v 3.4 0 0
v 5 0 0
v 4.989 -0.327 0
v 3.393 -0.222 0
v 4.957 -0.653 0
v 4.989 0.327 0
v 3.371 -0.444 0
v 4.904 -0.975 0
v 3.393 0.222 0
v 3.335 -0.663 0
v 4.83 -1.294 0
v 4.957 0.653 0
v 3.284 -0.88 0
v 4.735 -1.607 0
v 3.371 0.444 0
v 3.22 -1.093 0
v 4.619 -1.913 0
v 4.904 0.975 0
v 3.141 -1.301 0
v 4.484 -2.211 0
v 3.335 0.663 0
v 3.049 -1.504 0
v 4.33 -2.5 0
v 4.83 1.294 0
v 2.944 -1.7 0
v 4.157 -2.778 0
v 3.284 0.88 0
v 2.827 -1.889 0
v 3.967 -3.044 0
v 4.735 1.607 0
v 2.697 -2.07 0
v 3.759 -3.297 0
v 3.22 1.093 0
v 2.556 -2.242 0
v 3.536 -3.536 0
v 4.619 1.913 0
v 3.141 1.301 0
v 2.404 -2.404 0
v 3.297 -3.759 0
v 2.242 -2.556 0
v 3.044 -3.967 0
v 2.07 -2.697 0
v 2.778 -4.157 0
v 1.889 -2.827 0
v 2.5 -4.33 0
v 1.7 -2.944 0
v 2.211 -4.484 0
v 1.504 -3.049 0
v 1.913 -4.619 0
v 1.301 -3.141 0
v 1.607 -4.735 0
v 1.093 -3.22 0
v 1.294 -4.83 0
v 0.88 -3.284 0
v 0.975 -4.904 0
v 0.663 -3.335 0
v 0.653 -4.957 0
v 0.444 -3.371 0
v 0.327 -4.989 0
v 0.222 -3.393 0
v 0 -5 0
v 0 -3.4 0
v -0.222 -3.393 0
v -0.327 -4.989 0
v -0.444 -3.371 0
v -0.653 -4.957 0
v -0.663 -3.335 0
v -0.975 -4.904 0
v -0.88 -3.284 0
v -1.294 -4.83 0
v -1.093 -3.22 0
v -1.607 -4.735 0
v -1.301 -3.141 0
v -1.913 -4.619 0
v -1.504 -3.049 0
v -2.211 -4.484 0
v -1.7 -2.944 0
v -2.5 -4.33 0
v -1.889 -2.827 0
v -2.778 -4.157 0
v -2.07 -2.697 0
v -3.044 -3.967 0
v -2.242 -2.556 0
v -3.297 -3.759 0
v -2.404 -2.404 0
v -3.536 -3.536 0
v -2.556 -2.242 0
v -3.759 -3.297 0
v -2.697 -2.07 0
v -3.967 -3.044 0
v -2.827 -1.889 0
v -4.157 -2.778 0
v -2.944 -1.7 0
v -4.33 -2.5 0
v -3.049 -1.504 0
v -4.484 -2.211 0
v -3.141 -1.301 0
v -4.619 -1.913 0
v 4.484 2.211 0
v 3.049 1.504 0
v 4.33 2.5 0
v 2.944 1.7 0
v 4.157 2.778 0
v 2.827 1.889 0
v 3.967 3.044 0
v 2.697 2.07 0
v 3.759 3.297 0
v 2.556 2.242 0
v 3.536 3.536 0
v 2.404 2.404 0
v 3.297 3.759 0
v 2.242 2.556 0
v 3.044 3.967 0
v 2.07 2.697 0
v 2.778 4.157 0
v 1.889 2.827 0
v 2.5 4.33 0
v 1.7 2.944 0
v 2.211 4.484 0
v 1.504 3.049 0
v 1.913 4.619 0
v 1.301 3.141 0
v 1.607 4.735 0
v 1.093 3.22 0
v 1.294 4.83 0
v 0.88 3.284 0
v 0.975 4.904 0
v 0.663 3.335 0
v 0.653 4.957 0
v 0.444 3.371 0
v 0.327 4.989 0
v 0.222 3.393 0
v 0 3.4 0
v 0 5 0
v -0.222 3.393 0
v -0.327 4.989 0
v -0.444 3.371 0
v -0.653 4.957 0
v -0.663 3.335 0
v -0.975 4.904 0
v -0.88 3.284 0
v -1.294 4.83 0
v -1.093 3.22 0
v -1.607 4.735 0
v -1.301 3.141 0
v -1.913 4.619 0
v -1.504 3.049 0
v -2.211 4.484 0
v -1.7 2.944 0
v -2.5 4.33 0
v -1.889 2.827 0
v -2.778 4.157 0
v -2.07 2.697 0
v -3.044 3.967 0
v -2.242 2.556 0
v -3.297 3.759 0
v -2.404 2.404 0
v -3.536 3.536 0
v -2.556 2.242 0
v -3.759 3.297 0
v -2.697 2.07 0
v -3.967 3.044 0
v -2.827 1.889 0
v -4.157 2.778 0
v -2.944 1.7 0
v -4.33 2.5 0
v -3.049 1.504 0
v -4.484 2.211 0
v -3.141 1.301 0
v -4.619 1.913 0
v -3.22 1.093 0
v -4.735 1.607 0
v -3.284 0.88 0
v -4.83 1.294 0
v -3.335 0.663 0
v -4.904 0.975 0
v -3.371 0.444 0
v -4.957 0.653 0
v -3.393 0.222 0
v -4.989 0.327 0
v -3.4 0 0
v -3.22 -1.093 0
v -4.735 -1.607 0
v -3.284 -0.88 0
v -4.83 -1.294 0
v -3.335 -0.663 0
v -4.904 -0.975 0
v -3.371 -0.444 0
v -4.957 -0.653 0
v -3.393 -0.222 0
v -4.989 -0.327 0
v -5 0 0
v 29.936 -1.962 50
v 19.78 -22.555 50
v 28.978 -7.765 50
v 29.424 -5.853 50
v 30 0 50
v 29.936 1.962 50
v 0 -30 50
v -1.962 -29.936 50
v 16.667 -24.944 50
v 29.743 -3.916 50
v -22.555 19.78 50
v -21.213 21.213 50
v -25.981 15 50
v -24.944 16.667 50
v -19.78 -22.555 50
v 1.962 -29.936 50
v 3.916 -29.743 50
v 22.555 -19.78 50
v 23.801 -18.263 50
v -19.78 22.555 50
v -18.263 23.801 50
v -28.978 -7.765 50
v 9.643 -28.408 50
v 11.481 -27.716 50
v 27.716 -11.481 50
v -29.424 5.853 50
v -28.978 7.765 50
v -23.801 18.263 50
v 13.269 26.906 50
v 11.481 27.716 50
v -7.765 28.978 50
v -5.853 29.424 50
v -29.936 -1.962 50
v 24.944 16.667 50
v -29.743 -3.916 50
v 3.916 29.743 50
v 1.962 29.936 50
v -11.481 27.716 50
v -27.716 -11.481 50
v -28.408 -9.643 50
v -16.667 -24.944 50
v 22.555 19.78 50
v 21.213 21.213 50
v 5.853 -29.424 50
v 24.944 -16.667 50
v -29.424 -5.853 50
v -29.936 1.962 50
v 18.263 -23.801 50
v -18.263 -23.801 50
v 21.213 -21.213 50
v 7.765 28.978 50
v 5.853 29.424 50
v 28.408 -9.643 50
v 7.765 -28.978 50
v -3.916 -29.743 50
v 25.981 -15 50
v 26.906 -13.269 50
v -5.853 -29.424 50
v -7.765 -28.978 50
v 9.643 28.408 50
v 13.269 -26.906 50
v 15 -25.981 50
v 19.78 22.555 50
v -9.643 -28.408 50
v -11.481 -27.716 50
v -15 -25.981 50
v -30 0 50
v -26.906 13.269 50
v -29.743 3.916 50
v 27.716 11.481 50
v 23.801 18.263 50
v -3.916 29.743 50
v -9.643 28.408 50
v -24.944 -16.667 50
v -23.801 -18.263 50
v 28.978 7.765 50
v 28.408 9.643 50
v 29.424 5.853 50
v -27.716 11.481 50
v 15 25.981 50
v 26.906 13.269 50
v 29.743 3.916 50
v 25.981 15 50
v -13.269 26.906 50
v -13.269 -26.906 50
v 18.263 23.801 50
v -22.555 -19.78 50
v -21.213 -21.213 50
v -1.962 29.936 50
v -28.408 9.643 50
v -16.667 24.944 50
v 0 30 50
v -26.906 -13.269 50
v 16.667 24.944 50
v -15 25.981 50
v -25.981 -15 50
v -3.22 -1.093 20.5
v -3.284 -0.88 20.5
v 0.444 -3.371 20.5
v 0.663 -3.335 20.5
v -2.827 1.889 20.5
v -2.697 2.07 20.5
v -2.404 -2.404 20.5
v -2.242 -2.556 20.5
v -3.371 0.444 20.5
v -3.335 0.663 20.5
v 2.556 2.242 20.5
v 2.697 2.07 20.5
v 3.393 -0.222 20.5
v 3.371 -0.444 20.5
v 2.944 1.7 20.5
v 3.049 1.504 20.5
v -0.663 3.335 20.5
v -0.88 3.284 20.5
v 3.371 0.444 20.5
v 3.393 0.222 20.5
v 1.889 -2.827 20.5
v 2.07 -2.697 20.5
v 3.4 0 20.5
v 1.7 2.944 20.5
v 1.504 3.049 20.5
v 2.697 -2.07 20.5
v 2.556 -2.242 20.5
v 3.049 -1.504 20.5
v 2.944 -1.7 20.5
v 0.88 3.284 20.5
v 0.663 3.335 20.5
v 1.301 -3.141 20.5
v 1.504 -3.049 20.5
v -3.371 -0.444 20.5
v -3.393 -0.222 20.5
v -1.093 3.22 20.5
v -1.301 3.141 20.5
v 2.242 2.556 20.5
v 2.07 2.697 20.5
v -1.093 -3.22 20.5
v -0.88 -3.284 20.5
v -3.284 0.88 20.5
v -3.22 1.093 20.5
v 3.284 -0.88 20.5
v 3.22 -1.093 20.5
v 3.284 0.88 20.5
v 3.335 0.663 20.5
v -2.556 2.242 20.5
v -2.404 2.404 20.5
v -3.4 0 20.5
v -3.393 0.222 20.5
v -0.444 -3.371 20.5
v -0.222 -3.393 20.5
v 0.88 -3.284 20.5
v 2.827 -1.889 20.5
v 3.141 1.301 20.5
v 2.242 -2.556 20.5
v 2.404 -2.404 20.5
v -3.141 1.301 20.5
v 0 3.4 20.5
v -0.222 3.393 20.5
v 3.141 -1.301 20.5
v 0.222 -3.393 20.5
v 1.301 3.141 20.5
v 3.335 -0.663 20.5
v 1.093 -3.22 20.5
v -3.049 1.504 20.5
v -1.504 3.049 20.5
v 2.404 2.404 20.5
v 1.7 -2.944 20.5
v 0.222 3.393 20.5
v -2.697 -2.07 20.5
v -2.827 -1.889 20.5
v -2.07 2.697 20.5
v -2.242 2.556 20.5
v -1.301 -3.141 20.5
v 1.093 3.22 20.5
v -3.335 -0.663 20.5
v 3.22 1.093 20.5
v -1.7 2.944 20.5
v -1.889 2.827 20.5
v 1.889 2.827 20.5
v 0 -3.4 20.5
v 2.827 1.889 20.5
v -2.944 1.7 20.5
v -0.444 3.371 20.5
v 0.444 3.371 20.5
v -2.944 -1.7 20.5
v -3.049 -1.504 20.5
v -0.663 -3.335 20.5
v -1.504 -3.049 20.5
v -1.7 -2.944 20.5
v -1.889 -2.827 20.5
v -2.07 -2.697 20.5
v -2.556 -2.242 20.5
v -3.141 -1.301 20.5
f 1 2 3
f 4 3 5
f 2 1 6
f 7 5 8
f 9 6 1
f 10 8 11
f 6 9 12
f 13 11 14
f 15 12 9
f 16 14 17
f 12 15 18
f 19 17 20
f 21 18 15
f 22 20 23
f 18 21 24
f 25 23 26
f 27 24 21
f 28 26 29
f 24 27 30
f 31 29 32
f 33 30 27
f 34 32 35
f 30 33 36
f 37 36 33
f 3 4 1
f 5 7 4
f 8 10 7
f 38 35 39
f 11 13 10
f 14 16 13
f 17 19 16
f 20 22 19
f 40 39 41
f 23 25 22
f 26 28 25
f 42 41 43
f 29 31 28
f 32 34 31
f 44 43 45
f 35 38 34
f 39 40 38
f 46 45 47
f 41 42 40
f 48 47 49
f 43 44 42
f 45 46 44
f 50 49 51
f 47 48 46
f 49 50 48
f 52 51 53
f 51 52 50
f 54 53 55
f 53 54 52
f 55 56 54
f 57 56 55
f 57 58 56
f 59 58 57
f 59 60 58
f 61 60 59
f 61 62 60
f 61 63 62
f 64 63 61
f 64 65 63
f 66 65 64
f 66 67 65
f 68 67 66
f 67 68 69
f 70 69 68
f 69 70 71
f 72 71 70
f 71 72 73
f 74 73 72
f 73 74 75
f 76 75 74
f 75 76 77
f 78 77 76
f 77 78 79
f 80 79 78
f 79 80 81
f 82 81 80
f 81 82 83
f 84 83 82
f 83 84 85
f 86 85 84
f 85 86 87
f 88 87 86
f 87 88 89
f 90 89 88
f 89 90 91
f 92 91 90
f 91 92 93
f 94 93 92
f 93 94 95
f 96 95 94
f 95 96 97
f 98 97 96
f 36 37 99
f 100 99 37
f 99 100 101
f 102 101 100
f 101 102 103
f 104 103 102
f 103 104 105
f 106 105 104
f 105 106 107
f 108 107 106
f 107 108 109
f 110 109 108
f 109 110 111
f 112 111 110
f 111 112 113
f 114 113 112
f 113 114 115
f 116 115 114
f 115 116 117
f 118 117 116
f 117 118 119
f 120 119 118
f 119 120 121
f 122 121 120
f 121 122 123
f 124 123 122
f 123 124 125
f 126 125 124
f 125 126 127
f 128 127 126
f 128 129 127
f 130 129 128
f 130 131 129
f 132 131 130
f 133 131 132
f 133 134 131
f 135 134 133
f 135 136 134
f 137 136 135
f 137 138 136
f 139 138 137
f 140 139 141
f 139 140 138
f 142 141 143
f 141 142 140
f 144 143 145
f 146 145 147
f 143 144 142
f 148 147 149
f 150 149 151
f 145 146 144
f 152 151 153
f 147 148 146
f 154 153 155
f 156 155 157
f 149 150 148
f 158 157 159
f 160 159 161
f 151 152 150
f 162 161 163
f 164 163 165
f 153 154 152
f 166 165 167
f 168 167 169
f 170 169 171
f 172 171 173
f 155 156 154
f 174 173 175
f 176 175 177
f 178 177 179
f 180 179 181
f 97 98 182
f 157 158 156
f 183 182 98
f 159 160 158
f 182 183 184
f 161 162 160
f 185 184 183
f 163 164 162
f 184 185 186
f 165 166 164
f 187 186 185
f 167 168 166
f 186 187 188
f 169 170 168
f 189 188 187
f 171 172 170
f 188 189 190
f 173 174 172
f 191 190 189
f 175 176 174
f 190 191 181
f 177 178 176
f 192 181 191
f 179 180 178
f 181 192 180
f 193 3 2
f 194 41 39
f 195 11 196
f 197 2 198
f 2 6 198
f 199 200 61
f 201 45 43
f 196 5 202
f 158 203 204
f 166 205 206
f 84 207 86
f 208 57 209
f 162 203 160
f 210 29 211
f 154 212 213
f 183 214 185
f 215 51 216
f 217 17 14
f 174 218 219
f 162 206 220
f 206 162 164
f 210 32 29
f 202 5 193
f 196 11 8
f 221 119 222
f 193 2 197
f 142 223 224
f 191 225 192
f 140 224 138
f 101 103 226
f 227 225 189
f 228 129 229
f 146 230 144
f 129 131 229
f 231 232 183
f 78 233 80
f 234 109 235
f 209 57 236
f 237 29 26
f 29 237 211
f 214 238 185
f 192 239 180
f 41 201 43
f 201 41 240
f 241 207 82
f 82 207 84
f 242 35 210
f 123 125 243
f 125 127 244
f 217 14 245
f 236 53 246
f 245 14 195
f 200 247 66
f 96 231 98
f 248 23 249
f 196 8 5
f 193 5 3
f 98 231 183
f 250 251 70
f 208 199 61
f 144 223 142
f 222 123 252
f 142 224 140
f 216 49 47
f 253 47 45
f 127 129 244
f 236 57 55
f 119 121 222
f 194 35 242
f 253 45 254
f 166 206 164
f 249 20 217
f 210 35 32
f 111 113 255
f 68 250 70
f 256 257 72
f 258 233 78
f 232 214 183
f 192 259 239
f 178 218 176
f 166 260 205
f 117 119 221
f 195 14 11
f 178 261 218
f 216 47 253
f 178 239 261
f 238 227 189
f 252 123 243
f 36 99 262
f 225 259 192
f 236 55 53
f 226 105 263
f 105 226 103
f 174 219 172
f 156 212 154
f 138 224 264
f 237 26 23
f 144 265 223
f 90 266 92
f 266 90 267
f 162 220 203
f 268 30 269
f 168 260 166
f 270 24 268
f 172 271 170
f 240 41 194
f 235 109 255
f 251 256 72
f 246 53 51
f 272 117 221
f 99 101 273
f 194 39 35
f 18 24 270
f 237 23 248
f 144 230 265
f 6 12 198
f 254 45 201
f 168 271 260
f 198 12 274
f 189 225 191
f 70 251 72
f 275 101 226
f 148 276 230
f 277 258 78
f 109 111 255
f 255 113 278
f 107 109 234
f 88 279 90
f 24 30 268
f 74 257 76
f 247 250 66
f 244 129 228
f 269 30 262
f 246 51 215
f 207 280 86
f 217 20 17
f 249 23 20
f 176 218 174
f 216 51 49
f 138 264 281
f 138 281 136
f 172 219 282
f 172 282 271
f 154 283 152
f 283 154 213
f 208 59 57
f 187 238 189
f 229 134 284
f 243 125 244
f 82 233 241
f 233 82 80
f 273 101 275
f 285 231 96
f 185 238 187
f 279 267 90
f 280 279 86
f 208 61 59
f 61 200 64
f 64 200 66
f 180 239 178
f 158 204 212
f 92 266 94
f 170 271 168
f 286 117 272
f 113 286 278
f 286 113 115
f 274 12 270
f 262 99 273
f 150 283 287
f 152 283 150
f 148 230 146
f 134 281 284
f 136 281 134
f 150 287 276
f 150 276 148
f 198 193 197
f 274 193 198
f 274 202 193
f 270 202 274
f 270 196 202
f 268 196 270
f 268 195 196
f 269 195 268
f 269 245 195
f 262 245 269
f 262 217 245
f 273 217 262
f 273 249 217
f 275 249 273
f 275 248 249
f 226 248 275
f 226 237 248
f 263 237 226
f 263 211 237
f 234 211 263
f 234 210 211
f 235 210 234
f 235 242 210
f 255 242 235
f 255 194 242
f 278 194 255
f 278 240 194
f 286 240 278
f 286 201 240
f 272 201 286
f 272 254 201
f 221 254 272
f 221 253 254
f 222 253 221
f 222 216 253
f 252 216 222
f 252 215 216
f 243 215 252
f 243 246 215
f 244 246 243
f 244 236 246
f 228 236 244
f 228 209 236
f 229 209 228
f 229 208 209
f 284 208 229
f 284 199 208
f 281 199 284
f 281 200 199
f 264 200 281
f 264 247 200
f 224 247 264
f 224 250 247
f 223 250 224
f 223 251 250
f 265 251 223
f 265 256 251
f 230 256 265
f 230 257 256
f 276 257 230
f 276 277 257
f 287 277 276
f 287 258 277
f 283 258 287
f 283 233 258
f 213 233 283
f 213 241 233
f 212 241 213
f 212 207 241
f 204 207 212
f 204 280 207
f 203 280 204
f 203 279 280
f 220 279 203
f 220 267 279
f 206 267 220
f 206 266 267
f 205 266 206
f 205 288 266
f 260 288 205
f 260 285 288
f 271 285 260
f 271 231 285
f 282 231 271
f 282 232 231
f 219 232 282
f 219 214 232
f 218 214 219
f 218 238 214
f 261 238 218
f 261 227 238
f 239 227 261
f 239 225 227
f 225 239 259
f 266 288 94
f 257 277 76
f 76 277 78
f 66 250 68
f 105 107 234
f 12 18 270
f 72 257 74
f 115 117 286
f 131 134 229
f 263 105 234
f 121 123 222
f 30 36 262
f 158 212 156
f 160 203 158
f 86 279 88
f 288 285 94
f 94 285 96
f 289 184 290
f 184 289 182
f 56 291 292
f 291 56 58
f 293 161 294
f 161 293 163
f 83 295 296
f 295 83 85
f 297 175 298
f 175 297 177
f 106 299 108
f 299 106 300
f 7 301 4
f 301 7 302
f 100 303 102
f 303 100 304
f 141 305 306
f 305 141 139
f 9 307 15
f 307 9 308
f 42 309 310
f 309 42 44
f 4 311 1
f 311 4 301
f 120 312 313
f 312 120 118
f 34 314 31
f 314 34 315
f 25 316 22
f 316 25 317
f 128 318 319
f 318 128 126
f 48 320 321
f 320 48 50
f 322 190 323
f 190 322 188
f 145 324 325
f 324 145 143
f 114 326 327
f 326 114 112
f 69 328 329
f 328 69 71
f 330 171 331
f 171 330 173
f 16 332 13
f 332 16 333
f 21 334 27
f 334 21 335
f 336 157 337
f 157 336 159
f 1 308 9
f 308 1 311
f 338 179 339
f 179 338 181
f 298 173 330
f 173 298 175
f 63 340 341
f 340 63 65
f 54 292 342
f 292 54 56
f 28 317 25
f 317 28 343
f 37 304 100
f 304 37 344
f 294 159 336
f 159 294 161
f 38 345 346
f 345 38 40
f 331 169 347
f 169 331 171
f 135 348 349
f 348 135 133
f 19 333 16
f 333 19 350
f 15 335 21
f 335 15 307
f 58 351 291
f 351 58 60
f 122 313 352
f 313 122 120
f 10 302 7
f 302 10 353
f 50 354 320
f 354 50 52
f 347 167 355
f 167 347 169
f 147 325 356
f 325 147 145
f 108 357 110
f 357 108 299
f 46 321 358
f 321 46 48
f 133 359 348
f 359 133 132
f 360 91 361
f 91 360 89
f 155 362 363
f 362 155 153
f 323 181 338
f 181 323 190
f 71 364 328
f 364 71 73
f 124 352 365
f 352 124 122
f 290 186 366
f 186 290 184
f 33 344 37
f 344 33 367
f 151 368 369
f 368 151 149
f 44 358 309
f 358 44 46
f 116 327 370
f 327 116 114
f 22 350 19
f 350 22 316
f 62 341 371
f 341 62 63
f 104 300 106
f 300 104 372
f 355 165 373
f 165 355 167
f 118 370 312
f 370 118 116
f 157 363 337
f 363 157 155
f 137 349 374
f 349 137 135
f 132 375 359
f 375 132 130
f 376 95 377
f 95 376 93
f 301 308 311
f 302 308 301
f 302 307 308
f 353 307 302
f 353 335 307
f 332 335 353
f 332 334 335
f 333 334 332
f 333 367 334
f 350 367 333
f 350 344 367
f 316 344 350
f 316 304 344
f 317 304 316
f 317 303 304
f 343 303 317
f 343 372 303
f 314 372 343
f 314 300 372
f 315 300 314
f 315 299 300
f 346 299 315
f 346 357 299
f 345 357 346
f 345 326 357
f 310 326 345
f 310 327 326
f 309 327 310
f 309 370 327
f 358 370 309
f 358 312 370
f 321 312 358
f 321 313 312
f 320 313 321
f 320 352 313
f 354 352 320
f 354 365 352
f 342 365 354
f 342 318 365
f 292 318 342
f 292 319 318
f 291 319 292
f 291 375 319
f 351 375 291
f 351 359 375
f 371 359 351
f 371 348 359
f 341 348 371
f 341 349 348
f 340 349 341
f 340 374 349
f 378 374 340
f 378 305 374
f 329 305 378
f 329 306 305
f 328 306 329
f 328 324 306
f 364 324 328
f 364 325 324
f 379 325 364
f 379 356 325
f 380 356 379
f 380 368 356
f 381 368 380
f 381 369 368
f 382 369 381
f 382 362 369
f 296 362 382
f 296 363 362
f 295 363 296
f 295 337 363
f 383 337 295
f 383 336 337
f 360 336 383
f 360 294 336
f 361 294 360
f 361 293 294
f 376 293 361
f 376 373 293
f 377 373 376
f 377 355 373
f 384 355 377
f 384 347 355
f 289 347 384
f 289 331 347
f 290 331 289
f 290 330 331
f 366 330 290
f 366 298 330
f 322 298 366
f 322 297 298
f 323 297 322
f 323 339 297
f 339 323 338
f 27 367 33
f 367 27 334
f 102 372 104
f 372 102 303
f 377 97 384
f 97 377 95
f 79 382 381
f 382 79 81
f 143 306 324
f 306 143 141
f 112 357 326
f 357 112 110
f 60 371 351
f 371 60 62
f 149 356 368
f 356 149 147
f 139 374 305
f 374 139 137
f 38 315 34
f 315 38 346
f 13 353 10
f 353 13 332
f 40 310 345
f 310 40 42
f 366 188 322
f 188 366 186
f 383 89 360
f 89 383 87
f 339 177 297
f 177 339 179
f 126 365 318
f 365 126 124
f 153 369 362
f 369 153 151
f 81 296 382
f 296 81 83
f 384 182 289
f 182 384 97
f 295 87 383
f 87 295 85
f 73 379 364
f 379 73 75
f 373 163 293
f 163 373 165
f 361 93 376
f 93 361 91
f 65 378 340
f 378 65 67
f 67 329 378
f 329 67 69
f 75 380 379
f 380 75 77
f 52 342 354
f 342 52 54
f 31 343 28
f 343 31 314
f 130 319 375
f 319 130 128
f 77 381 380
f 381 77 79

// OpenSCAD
// Small lab funnel - printed upright, open at top and bottom
// Units: mm

// ---- Parameters ----
spout_od      = 10;    // spout outer diameter
spout_id      = spout_od - 2 * 1.6;  // spout bore (6.8)
spout_h       = 20;    // spout height (z = 0 to 20)
cone_top_d    = 10;    // cone diameter where it meets the spout (z = 20)
cone_rim_d    = 60;    // cone rim diameter (z = 50)
cone_h        = cone_rim_d - cone_top_d;  // cone height (30)
wall          = 1.6;   // wall thickness everywhere
eps           = 0.5;   // cutter overshoot past faces

$fn = 96;

// ---- Model ----
difference() {
    union() {
        // Spout (tube)
        cylinder(d = spout_od, h = spout_h);
        // Cone - note: cylinder(d1,d2,h) has d1 at the lower end (z = 20)
        cylinder(d1 = cone_top_d, d2 = cone_rim_d, h = cone_h);
    }
    // Bore through the spout
    translate([0, 0, -eps])
        cylinder(d = spout_id, h = spout_h + 2 * eps);
    // Cone is open at both ends (no inner wall modelled)
}
